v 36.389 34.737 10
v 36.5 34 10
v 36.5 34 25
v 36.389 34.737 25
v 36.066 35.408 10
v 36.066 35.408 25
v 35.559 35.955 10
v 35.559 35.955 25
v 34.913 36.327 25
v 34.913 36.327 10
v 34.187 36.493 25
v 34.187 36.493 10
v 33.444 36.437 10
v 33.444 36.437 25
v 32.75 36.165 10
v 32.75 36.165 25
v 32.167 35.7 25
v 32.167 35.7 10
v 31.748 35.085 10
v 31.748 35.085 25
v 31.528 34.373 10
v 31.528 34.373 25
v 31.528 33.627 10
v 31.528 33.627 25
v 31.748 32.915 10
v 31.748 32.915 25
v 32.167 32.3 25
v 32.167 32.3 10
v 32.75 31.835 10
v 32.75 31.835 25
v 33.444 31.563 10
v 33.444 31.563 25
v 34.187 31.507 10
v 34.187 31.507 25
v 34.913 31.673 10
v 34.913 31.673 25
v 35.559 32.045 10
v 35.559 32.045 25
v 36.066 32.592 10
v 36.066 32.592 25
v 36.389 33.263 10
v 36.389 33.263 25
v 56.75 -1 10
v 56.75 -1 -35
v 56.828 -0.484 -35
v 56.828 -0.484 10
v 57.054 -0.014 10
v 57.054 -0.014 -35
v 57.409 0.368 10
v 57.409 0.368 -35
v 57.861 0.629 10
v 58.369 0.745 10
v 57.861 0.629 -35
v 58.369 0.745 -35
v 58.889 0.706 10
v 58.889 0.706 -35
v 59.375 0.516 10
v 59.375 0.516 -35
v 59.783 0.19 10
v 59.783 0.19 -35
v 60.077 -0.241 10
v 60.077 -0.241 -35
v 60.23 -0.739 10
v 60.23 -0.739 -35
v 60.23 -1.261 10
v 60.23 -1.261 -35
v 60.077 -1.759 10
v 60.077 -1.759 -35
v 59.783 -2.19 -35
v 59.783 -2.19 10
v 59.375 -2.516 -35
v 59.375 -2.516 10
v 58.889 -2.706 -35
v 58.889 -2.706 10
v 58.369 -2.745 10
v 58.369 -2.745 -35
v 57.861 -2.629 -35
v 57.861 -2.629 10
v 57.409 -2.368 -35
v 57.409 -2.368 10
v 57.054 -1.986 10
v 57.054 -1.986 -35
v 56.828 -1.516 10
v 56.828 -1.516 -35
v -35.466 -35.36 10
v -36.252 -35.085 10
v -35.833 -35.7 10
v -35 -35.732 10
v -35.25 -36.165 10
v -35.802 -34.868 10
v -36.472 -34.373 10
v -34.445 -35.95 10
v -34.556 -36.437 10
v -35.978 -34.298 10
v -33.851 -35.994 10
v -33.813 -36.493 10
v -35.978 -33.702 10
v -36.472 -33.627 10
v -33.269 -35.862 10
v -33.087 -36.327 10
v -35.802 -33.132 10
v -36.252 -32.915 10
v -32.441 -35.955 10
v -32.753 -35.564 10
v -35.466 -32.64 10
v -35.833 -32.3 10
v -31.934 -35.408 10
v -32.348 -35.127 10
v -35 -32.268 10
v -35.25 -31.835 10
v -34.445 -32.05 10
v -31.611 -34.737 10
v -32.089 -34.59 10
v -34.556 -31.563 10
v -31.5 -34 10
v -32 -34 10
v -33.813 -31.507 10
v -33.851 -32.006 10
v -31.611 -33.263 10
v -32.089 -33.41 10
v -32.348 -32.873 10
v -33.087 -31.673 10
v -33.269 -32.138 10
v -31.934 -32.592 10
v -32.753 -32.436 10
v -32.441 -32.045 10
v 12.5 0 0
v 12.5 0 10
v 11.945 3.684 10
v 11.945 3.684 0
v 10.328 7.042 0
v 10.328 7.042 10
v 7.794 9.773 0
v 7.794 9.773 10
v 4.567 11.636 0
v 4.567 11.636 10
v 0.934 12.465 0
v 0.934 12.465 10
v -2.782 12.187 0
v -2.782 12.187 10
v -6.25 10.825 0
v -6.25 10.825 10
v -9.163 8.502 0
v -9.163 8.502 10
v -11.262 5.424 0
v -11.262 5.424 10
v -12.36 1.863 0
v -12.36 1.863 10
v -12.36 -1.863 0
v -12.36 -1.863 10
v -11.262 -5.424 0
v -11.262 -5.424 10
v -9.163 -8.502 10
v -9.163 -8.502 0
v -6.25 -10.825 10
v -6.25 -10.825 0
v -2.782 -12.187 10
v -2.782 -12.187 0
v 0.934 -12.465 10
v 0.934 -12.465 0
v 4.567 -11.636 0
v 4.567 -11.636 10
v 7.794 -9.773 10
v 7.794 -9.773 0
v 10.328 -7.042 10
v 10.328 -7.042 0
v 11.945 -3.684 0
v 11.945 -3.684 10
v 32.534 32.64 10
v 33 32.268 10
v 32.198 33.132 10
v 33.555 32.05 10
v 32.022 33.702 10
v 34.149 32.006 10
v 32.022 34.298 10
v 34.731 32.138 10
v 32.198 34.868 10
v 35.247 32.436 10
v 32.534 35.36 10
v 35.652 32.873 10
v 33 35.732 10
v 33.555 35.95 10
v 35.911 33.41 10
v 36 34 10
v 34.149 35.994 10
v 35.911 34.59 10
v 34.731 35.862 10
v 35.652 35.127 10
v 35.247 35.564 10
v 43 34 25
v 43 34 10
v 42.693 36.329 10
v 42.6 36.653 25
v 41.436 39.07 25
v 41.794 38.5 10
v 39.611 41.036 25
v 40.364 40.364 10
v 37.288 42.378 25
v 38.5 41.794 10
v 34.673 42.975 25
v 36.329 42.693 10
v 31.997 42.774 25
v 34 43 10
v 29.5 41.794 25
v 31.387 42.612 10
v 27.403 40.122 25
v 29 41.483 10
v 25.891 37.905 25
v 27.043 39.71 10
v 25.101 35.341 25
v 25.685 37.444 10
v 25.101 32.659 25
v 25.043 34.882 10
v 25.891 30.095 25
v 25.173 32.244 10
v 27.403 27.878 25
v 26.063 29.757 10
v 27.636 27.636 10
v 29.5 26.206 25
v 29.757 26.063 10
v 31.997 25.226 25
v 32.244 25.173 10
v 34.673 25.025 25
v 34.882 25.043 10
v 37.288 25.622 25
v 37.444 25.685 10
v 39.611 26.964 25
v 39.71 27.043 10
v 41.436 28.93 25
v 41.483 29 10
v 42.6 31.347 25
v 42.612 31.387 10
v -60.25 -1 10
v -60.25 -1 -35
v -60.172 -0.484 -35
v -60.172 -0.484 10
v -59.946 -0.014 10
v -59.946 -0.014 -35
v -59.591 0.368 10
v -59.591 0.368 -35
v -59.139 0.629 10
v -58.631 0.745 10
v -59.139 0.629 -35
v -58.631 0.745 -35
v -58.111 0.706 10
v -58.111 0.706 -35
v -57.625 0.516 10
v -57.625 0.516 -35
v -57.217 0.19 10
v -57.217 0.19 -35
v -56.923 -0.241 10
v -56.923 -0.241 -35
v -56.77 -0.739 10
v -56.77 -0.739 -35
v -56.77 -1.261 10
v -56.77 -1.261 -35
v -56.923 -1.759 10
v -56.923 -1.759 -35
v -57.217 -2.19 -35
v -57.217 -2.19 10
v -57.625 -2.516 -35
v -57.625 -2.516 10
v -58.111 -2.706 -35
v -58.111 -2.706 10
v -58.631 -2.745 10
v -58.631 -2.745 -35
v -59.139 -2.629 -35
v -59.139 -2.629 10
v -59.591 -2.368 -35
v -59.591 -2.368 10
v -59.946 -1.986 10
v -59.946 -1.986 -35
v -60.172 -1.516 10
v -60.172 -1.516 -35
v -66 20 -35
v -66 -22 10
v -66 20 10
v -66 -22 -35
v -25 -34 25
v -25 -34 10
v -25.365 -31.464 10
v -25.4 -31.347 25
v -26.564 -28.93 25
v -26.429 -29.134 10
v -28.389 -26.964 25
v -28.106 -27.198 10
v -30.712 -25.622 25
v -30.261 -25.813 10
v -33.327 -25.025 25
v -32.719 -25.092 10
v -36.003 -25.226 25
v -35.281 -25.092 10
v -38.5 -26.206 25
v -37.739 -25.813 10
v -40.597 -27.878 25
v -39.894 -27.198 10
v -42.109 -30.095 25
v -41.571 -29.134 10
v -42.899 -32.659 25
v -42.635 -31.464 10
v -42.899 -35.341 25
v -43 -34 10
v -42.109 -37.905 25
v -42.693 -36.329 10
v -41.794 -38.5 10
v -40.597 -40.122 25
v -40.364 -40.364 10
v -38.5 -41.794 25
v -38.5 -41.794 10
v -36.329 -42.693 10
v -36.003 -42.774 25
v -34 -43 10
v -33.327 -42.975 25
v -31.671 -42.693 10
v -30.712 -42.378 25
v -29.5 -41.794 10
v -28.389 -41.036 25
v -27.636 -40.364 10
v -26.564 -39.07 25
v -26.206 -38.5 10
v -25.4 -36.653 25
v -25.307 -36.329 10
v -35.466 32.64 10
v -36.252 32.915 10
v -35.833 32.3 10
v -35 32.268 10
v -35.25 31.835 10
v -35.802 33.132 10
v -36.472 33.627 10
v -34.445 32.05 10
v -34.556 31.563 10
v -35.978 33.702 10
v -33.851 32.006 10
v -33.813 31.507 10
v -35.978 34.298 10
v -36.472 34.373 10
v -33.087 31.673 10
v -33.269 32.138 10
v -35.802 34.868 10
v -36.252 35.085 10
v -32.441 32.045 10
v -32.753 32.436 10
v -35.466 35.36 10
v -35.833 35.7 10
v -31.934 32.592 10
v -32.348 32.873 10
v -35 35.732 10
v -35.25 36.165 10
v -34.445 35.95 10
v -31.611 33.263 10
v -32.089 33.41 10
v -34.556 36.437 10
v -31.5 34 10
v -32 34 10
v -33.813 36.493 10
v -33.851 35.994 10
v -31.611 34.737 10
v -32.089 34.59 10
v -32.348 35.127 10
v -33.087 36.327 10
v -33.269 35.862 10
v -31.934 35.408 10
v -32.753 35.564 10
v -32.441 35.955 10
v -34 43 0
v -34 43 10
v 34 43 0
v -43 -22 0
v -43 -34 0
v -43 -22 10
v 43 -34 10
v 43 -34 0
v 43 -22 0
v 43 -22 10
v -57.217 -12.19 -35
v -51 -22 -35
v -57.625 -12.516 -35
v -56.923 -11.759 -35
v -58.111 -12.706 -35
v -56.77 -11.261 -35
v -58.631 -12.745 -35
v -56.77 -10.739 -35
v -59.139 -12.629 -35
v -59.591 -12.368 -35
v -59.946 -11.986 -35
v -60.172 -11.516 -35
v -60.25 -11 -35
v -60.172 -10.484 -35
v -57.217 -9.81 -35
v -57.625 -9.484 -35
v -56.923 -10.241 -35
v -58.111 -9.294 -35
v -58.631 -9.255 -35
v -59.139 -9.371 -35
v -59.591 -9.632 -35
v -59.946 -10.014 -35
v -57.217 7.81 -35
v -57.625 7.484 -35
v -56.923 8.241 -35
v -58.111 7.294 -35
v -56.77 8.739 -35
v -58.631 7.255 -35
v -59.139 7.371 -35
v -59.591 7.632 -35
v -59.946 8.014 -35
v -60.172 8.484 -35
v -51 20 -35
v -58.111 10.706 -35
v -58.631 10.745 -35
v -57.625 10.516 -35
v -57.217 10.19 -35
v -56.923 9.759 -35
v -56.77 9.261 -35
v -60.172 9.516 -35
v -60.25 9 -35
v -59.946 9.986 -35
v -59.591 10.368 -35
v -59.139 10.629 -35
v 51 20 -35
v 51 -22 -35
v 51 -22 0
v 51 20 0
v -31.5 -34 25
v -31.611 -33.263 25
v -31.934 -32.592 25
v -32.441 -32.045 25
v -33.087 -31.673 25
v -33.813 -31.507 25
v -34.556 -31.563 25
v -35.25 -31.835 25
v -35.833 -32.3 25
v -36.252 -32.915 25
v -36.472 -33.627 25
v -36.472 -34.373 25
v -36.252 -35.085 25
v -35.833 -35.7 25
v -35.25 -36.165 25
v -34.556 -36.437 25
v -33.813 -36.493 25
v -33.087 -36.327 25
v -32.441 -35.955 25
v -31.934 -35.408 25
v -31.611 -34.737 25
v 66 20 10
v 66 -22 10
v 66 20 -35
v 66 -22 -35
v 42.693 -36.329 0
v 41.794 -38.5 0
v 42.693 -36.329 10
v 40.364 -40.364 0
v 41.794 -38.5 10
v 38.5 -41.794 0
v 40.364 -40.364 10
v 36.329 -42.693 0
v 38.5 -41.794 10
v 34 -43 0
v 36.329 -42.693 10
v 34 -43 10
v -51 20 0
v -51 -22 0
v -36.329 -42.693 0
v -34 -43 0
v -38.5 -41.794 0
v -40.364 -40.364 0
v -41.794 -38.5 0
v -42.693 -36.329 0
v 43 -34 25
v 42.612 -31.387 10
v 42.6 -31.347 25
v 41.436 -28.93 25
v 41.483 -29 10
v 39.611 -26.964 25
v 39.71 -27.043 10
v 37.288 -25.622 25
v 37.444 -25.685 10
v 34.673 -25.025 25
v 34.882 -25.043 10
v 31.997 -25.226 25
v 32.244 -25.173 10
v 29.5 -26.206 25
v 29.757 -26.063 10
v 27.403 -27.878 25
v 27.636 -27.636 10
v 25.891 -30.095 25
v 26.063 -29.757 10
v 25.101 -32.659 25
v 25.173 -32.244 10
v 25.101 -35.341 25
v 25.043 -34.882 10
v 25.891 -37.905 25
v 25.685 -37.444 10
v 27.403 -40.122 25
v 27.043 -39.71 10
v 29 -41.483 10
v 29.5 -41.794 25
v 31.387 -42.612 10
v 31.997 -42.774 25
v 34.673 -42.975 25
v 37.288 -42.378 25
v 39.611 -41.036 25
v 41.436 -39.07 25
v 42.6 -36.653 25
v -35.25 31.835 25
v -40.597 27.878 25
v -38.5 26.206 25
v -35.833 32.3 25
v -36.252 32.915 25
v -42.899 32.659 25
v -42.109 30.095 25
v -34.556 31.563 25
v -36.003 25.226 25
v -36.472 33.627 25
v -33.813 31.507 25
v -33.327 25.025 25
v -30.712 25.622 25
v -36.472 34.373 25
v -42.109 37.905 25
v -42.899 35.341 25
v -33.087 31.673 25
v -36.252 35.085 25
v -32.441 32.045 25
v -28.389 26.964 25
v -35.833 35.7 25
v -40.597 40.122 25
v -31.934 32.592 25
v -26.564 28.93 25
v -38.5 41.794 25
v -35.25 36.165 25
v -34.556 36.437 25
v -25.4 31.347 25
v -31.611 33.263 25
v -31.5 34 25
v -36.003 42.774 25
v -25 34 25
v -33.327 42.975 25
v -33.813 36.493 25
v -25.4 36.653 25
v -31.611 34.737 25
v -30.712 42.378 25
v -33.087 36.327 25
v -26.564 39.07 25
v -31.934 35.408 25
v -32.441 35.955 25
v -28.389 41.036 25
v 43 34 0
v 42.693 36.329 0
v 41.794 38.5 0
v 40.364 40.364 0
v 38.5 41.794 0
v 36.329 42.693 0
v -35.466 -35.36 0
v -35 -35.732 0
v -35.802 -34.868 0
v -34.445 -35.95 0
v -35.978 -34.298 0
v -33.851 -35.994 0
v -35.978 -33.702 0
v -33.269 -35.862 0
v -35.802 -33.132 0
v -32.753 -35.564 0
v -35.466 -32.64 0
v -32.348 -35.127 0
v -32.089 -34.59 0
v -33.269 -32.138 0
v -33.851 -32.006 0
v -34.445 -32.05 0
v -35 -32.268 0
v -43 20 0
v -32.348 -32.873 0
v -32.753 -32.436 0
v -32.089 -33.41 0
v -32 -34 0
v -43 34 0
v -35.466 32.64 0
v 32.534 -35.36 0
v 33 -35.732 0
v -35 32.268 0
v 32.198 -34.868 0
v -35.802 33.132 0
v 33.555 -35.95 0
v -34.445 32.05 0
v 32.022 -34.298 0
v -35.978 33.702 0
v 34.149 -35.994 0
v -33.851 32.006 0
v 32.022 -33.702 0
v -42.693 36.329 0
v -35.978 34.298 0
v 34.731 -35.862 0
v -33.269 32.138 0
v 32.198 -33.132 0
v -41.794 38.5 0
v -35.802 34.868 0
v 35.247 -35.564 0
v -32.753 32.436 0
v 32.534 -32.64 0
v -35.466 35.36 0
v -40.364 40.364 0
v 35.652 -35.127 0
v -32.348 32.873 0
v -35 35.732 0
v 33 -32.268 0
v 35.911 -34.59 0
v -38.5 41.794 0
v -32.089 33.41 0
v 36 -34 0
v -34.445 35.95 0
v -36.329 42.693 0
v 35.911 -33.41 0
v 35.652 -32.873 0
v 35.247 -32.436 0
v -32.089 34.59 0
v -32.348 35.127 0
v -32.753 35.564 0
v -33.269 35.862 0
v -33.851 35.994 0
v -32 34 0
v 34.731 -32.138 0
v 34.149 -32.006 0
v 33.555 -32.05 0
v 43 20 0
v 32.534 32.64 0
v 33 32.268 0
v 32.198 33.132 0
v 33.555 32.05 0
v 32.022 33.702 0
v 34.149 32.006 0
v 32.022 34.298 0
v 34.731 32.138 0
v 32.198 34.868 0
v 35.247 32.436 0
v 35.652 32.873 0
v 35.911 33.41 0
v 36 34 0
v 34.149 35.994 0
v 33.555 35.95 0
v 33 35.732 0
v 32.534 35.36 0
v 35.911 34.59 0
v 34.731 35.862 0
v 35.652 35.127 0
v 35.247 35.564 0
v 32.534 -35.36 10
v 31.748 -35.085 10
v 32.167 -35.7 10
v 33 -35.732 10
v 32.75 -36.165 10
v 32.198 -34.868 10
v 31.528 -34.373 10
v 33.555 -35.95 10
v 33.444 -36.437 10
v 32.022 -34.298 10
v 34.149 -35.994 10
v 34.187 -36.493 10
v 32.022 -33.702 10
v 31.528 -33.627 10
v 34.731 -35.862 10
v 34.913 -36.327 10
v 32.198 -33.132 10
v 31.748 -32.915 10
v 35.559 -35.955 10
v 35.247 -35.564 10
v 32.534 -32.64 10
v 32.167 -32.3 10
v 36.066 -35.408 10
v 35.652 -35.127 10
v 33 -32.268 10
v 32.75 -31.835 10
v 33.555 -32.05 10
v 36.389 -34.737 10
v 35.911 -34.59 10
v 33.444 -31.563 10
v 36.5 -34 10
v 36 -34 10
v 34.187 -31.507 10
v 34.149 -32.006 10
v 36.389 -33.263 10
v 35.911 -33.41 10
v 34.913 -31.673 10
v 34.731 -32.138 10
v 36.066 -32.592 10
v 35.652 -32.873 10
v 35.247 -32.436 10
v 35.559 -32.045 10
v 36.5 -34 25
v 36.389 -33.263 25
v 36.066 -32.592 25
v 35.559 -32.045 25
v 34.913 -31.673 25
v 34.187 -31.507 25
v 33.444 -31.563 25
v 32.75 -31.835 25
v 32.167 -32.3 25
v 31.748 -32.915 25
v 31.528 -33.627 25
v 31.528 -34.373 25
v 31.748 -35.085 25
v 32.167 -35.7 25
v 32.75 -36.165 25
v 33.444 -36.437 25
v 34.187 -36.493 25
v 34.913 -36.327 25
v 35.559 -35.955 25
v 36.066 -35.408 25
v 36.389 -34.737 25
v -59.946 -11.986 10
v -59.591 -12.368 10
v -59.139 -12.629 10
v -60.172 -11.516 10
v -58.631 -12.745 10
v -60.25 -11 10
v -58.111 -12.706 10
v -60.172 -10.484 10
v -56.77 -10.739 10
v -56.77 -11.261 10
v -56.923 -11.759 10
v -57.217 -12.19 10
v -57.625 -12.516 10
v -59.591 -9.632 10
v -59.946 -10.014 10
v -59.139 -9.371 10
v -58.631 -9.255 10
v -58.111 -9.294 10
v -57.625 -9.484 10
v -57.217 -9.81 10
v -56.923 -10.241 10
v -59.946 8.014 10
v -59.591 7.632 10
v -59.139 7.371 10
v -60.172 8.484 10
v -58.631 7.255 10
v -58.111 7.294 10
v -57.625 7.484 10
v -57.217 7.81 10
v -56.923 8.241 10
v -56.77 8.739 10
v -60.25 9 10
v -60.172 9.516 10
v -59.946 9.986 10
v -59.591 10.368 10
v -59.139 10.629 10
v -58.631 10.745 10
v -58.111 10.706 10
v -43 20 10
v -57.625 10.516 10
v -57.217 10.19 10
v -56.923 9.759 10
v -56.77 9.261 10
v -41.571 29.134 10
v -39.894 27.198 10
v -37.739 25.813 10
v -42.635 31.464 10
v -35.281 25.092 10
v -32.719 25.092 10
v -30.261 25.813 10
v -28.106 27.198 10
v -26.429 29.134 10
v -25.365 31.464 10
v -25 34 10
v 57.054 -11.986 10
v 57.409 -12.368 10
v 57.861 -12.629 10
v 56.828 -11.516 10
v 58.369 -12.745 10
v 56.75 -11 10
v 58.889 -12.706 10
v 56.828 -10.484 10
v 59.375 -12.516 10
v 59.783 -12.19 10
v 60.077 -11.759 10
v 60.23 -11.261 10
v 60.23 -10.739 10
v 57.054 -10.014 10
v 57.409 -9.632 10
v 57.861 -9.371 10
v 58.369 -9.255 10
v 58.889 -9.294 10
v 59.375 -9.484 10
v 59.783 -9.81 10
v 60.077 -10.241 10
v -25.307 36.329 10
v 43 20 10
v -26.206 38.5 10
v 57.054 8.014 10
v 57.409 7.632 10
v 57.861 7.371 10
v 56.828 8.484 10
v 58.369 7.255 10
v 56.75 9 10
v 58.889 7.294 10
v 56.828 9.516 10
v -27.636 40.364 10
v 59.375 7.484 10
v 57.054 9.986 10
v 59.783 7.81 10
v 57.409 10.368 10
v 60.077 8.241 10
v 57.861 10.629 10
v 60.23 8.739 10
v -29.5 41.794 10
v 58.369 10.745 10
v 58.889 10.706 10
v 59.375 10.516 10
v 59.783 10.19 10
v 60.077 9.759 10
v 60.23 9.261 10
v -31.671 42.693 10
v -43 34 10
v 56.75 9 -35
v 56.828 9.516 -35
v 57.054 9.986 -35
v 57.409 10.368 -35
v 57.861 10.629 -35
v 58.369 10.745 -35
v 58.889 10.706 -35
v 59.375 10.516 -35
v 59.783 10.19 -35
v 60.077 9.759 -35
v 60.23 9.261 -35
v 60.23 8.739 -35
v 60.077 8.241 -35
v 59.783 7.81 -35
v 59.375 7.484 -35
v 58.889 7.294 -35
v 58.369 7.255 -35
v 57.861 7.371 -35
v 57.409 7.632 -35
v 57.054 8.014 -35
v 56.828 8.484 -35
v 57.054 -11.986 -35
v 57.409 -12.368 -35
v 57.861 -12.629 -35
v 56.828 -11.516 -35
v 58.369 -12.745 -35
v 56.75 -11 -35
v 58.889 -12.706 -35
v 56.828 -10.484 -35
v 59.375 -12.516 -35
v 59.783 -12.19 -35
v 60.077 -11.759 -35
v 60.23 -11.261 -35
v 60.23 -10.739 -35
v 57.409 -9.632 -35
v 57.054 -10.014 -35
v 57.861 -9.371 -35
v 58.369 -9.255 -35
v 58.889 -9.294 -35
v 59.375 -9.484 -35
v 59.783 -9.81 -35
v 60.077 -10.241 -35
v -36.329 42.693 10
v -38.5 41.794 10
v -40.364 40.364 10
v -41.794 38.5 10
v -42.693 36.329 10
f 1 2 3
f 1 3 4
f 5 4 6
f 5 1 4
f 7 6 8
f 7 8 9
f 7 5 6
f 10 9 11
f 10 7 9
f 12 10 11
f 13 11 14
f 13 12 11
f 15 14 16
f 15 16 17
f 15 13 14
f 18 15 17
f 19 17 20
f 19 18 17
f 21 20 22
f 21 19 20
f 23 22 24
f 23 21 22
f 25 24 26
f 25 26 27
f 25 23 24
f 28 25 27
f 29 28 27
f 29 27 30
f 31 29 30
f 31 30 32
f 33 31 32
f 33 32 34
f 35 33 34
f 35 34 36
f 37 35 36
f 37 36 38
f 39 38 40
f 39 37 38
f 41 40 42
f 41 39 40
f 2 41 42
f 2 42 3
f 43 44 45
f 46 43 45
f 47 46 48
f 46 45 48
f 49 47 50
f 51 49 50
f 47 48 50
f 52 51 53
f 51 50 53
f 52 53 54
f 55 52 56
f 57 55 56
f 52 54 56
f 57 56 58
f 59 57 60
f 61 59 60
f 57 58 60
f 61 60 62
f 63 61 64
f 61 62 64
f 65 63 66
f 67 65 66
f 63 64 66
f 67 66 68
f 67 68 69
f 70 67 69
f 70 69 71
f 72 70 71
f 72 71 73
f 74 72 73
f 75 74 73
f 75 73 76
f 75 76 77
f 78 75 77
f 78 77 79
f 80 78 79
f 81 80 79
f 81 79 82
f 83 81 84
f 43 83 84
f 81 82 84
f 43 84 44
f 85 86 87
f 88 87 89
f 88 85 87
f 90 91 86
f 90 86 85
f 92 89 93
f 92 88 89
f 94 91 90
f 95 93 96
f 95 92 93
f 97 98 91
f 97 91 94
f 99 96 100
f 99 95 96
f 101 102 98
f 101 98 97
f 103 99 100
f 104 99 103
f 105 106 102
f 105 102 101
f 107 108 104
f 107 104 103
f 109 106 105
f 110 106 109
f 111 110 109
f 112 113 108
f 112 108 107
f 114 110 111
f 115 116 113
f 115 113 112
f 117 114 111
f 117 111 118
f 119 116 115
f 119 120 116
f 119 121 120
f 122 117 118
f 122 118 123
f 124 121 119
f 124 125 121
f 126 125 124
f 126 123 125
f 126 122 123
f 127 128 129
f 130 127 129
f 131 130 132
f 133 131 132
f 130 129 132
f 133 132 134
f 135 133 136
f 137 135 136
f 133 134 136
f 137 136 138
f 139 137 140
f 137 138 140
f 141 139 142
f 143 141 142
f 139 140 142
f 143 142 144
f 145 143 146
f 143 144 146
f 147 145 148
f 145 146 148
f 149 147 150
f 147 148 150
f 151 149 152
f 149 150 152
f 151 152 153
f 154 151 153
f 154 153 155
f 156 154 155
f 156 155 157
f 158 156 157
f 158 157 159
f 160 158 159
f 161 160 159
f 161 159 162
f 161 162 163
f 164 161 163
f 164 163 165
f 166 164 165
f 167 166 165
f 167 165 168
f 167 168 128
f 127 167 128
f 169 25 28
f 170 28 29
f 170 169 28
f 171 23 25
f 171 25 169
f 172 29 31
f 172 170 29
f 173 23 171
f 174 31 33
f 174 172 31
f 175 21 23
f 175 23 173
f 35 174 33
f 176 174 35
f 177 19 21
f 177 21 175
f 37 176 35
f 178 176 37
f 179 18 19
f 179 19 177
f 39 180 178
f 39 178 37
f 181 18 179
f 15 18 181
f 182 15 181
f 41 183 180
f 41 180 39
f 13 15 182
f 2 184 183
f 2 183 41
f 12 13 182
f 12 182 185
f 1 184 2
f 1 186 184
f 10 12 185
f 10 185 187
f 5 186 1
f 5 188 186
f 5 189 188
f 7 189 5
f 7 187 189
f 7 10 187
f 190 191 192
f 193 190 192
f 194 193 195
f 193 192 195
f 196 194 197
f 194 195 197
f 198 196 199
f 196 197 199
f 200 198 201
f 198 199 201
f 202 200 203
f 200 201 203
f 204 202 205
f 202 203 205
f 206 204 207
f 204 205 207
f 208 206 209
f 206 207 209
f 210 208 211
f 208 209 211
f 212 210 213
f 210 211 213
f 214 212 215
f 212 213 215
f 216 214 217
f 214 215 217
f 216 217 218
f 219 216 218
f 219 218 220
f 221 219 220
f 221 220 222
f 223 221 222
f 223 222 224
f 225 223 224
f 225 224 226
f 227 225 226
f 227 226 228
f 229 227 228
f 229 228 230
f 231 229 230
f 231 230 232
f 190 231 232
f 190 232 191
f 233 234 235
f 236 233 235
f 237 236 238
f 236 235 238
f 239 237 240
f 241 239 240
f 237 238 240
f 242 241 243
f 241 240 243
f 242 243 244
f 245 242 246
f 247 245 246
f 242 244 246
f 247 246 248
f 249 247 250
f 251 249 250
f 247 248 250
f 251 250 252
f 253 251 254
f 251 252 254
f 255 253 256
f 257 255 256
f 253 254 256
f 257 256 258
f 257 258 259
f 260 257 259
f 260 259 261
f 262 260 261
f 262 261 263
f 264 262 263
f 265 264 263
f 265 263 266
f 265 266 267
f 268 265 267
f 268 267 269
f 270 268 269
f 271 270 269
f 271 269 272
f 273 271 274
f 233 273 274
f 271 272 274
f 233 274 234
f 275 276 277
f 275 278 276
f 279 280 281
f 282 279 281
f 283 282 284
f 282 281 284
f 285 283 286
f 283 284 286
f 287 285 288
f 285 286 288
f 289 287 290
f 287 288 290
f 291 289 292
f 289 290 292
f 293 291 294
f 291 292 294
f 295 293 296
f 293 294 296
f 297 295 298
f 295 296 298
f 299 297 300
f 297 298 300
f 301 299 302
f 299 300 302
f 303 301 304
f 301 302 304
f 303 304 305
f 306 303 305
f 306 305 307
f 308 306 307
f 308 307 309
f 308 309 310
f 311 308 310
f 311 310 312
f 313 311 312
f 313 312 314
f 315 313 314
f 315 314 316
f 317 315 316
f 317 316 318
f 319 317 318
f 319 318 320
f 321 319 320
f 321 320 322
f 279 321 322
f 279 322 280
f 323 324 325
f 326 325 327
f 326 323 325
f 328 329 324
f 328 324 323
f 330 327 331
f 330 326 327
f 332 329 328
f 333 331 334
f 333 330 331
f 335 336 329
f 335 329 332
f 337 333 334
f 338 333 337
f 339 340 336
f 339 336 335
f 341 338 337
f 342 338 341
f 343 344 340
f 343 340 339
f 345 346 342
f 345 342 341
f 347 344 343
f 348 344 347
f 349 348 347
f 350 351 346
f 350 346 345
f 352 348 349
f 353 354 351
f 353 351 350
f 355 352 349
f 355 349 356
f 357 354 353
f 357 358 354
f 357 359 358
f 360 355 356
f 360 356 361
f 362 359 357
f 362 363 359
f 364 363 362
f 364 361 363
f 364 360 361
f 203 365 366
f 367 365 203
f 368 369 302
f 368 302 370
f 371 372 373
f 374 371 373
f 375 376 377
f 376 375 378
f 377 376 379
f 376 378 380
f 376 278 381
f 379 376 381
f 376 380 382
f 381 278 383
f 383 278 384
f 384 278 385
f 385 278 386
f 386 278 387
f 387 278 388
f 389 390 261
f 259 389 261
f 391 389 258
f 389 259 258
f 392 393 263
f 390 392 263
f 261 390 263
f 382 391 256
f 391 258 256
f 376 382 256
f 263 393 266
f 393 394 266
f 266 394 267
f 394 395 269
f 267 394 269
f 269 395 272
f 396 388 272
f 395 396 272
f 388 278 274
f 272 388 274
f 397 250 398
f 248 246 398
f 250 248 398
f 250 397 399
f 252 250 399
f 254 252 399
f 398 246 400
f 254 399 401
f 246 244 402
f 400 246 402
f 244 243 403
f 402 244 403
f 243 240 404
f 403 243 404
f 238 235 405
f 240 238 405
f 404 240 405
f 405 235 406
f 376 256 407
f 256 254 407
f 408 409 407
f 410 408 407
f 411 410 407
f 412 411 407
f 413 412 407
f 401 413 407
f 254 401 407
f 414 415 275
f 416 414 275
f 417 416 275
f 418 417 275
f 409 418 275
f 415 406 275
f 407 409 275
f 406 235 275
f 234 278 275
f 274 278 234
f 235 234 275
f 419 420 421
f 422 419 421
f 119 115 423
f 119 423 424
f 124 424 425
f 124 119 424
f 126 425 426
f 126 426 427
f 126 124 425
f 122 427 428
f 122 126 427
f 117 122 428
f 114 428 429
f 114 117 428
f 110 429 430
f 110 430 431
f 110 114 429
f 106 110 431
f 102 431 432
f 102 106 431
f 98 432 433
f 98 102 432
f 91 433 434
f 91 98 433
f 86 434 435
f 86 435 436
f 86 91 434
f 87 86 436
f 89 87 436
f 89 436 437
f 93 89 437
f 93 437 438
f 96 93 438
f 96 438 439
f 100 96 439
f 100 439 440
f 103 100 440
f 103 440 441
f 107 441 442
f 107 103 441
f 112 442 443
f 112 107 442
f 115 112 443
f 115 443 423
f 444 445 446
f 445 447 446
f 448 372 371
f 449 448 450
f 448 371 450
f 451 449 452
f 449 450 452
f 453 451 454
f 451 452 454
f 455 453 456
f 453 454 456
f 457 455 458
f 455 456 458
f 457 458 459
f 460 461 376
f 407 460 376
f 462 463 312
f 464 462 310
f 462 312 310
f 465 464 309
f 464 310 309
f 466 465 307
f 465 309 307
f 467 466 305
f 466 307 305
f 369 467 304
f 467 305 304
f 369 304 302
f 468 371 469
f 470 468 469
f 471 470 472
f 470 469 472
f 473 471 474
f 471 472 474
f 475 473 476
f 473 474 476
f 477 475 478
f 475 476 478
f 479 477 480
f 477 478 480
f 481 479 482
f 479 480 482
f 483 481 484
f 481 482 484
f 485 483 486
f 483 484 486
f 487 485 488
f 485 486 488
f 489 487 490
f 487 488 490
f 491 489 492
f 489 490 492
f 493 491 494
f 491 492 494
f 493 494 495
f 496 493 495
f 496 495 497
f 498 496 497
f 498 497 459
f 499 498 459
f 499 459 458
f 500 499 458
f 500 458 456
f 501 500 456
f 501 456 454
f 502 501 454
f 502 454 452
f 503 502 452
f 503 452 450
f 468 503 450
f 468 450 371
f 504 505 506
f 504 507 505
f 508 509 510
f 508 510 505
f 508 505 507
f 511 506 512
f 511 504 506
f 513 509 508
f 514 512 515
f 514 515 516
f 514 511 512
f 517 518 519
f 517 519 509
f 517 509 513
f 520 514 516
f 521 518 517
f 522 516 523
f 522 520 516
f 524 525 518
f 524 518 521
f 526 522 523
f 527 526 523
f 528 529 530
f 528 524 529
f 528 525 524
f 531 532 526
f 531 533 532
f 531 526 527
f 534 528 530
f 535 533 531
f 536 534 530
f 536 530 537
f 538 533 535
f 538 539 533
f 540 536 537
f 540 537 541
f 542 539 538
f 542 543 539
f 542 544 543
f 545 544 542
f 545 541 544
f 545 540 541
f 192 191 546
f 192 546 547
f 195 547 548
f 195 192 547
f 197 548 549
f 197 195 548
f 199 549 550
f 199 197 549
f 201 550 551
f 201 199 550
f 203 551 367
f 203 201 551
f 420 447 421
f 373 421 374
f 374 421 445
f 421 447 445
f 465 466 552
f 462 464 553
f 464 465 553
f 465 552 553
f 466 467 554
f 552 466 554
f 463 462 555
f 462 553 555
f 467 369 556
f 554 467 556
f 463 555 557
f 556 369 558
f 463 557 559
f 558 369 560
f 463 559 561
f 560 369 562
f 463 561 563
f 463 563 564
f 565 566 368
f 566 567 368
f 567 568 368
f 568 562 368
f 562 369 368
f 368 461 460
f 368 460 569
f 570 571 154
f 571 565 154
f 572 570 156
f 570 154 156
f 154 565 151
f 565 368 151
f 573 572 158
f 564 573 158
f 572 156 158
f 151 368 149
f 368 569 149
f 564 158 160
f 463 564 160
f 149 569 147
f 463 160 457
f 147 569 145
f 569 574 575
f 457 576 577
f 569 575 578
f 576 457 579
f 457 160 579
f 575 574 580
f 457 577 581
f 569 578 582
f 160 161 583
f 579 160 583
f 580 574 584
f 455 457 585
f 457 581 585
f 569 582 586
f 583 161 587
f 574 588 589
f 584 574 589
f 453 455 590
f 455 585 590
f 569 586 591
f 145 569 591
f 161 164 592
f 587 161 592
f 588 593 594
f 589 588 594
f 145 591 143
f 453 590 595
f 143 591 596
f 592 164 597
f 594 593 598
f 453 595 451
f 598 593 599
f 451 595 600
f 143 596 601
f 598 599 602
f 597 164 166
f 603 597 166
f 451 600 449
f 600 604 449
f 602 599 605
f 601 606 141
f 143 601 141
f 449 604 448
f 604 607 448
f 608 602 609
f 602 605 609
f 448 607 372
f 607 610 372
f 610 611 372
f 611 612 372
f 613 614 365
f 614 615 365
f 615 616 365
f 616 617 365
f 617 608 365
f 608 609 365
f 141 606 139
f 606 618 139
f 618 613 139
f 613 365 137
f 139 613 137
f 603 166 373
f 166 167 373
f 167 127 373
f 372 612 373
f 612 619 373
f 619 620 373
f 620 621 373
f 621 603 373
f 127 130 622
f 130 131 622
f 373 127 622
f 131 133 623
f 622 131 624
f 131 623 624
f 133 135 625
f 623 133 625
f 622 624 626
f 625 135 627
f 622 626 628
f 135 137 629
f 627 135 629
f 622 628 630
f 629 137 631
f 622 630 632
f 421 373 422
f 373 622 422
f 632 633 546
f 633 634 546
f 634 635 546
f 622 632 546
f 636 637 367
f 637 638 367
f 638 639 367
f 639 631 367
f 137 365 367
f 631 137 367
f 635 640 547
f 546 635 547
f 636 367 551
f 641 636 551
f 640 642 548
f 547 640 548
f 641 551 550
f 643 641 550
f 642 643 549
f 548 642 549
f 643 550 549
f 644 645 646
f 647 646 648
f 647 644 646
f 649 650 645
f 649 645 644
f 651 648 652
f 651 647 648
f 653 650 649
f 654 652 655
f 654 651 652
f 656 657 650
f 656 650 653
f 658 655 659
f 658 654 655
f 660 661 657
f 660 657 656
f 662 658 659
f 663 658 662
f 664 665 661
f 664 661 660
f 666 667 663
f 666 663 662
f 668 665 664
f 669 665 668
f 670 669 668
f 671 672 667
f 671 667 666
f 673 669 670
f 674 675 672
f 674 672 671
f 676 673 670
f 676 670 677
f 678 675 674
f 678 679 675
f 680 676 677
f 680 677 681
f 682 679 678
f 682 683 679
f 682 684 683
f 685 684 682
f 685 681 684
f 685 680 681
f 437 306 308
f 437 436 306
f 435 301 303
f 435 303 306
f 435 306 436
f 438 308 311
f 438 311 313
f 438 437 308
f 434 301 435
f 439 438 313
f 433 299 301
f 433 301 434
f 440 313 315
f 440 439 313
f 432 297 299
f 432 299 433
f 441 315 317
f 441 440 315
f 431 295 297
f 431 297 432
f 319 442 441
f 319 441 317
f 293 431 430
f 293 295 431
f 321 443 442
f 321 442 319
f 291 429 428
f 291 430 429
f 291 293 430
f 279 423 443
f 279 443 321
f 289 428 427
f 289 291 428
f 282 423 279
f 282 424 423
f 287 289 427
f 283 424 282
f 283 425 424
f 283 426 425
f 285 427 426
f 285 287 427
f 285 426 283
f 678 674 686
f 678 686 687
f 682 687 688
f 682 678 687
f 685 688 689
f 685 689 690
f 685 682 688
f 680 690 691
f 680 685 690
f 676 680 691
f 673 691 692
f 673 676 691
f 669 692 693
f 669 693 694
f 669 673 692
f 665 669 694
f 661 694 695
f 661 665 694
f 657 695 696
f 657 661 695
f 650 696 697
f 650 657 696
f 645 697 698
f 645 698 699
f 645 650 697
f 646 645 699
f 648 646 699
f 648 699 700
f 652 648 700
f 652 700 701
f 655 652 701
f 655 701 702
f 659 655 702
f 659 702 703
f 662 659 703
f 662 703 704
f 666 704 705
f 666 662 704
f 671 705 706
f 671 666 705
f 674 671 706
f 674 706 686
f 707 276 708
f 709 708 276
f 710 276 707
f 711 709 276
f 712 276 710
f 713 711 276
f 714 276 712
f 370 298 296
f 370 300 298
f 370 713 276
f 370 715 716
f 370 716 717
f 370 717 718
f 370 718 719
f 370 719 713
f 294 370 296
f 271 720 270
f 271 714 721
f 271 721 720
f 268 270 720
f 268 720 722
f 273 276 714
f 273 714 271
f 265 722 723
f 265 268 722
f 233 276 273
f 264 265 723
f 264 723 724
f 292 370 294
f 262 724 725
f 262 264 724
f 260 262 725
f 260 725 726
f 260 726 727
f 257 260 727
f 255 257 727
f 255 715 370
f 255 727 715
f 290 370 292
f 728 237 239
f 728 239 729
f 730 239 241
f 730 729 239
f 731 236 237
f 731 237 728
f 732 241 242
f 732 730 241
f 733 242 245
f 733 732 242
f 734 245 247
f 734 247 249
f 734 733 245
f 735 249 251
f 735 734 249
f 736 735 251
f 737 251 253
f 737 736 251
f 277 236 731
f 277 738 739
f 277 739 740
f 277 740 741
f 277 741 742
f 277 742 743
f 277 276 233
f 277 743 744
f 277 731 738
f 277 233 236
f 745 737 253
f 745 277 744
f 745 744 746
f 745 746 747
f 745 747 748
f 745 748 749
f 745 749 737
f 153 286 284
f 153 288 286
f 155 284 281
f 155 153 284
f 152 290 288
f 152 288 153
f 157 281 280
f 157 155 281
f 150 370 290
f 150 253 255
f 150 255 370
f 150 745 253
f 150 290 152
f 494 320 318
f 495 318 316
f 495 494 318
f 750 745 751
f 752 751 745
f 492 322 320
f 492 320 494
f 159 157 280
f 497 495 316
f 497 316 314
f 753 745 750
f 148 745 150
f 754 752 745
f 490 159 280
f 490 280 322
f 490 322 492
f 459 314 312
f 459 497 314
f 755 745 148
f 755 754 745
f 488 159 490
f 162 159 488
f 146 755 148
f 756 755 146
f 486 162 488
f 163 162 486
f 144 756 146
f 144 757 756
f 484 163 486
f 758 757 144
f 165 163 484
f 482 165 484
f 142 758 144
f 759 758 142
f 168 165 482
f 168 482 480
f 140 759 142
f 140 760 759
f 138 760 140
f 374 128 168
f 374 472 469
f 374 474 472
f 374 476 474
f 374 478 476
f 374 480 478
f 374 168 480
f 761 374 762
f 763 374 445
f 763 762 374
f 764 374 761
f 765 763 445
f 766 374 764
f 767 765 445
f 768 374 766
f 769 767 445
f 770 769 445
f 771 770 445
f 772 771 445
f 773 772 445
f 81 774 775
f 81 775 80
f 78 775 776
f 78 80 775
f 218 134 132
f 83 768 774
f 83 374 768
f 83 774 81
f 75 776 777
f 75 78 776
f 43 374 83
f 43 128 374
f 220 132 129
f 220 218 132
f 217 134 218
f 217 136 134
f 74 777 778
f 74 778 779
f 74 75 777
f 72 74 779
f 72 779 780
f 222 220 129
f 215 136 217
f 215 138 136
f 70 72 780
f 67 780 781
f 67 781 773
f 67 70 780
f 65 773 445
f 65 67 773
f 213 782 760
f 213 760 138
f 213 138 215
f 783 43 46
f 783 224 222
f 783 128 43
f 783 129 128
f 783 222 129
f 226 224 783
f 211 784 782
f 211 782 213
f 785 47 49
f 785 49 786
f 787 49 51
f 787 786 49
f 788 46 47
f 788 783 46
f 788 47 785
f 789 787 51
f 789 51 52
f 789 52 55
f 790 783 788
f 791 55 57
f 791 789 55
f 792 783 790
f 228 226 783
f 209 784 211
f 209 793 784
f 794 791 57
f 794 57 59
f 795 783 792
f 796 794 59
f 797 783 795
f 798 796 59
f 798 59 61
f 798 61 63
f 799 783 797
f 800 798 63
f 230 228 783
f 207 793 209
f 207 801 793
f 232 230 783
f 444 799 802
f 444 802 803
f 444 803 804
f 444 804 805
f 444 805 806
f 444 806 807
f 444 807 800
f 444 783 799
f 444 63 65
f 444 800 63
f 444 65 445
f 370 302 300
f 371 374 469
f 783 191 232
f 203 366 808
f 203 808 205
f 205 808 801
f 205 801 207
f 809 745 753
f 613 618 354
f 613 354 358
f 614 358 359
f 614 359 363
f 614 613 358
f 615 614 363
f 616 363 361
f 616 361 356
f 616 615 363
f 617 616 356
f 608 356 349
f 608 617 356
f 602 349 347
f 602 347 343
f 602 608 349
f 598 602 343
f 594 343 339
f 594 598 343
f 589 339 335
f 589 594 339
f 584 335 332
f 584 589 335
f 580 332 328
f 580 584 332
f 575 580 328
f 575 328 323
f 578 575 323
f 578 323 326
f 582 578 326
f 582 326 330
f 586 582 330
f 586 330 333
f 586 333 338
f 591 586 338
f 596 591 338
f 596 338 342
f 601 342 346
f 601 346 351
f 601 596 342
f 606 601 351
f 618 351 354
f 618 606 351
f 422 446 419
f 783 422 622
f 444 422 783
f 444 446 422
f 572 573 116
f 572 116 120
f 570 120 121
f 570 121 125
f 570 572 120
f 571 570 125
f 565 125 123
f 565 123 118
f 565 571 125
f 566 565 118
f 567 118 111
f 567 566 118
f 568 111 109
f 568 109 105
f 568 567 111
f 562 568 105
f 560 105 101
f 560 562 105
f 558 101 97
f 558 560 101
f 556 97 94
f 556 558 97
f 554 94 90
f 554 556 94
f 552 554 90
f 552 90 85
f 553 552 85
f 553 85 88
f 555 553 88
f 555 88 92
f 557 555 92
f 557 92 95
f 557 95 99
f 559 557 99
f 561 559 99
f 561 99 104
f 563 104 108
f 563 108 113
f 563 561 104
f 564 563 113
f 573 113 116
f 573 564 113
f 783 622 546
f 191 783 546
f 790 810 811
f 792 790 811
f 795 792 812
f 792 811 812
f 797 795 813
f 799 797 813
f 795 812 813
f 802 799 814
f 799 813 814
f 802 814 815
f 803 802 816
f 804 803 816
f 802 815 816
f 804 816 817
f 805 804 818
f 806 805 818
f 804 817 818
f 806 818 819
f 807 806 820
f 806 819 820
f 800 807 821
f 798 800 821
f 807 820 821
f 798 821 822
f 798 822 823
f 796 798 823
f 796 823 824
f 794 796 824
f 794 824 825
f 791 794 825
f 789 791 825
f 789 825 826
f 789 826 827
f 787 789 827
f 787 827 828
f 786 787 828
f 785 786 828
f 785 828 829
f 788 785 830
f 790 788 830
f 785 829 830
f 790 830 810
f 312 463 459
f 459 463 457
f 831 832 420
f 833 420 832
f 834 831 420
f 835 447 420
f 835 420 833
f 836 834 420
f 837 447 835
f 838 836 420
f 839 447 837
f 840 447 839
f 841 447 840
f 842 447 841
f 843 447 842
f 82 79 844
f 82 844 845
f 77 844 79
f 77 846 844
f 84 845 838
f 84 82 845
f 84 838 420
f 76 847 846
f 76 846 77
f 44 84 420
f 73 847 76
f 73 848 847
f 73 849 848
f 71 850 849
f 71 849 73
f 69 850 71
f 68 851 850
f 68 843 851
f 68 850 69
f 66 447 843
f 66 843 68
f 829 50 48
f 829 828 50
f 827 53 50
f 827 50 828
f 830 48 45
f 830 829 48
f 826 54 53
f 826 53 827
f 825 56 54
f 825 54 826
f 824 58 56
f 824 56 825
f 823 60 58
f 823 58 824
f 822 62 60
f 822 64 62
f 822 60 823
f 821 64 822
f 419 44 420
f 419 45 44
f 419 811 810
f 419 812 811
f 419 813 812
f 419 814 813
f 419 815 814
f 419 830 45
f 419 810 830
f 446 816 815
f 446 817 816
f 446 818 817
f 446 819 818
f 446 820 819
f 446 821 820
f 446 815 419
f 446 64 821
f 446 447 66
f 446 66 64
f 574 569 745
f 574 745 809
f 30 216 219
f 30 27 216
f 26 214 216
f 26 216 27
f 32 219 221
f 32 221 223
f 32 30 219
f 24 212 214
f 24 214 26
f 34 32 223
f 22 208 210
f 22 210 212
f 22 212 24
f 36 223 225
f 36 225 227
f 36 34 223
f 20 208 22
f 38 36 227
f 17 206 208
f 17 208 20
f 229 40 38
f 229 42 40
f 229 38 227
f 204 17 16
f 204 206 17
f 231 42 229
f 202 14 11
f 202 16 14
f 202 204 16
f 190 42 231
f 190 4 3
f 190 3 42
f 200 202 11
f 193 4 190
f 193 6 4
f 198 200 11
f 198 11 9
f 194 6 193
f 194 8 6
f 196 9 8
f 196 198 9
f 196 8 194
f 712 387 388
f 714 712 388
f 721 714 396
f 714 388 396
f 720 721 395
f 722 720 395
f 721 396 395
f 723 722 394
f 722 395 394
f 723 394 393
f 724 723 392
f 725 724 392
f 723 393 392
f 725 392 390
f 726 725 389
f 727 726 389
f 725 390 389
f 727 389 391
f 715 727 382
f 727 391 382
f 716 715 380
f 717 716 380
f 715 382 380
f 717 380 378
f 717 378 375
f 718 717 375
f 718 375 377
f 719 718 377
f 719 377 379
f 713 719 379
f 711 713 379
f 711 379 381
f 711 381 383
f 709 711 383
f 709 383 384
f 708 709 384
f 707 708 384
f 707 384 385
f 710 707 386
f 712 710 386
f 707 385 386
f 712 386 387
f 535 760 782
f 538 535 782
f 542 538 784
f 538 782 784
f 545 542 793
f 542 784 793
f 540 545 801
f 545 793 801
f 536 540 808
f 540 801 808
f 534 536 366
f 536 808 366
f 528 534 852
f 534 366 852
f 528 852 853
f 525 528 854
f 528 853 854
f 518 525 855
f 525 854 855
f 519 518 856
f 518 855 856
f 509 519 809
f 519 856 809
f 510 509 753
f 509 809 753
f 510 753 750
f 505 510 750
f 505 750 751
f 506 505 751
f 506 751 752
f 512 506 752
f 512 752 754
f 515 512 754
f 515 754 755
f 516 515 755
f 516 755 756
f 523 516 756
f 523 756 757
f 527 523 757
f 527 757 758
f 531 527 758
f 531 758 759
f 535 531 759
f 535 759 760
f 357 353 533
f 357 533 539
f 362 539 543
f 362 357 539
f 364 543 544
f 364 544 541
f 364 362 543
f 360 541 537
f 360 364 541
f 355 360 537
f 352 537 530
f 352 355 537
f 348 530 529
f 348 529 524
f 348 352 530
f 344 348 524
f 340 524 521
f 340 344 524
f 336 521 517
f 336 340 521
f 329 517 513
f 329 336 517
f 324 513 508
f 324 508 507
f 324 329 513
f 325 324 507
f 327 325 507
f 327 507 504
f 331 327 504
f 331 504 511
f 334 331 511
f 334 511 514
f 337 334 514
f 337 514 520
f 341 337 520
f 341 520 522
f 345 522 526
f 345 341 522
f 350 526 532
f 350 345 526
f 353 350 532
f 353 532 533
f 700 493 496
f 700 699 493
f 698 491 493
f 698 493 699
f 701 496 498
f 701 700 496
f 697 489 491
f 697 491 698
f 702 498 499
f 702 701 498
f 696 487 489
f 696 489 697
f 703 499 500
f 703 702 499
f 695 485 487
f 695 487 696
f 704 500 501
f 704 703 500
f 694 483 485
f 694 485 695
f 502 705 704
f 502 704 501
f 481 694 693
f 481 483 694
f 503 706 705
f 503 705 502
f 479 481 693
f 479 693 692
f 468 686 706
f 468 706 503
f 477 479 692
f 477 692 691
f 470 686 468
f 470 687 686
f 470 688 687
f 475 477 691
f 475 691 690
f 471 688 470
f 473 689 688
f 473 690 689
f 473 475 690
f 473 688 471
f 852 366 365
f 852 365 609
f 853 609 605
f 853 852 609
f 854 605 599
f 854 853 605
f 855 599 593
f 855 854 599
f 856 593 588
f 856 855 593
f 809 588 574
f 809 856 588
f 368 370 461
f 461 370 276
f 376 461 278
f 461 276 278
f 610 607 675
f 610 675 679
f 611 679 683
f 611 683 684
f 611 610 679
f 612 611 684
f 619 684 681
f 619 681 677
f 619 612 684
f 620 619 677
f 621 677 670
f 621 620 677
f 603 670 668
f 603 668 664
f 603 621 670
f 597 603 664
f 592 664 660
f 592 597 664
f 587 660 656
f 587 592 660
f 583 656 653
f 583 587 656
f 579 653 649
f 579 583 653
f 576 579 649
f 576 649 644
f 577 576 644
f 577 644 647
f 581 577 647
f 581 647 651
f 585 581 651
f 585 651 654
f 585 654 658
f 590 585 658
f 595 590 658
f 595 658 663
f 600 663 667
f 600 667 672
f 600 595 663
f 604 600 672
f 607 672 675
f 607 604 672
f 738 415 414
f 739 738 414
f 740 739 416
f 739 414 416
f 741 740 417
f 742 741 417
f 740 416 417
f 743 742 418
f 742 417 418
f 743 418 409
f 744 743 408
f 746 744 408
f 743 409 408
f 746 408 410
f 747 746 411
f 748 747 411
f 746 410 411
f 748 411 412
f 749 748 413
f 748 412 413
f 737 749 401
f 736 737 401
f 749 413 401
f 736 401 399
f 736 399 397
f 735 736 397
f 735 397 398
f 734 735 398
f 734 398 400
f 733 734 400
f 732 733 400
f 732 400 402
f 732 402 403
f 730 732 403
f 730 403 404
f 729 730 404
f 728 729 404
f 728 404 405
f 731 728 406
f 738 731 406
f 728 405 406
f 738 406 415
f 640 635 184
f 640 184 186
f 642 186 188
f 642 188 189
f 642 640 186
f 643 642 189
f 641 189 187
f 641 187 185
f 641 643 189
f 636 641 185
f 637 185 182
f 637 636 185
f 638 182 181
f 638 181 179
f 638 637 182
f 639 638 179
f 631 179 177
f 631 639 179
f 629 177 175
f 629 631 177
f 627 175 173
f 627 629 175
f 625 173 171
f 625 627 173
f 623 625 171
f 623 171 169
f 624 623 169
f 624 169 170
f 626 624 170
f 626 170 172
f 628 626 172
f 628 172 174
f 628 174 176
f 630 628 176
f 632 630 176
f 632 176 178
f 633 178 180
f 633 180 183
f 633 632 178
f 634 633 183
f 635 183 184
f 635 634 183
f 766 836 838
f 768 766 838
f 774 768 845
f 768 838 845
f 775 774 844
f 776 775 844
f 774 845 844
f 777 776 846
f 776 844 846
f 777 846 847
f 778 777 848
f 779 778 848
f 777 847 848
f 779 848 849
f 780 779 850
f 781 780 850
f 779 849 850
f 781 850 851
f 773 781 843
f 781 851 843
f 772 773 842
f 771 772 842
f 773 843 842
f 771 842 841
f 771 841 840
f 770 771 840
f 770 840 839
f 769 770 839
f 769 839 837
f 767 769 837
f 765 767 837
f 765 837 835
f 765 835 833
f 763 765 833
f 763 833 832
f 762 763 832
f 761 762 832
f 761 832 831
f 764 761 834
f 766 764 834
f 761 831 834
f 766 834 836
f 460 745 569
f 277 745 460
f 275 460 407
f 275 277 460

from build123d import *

# Parameters (mm, degrees)
SKETCH_1_W          = 86
SKETCH_1_H          = 86
SKETCH_1_R          = 2
EXTRUDE_1_DEPTH     = 10
FILLET_1_R          = 5
SKETCH_2_R          = 9
SKETCH_2_R_2        = 2.5
EXTRUDE_2_DEPTH     = 15
SKETCH_3_R          = 12.5
CUT_EXTRUDE_1_DEPTH = 16
SKETCH_8_W          = 10
SKETCH_8_H          = 42
EXTRUDE_7_DEPTH     = 35
EXTRUDE_7_2_DEPTH   = 35
SKETCH_9_W          = 23
SKETCH_9_H          = 42
EXTRUDE_8_DEPTH     = 10
CUT_EXTRUDE_2_DEPTH = 10
SKETCH_11_W         = 35
SKETCH_11_H         = 42
EXTRUDE_9_DEPTH     = 5
SKETCH_12_W         = 35
SKETCH_12_H         = 42
EXTRUDE_10_DEPTH    = 5
SKETCH_13_R         = 1.75
CUT_EXTRUDE_3_DEPTH = 45


with BuildPart() as part:
    # 草图1 → 凸台-拉伸1 (new body)
    with BuildSketch(Plane.XY):
        Rectangle(SKETCH_1_W, SKETCH_1_H)
        with Locations((-34, 34)):
            Circle(SKETCH_1_R, mode=Mode.SUBTRACT)
        with Locations((34, 34)):
            Circle(SKETCH_1_R, mode=Mode.SUBTRACT)
        with Locations((34, -34)):
            Circle(SKETCH_1_R, mode=Mode.SUBTRACT)
        with Locations((-34, -34)):
            Circle(SKETCH_1_R, mode=Mode.SUBTRACT)
    extrude(amount=EXTRUDE_1_DEPTH)

    # 圆角1
    fillet_1_edges = [part.edges().sort_by_distance(p)[0] for p in [
        (-43, 43, 5),
        (43, 43, 5),
        (43, -43, 5),
        (-43, -43, 5),
    ]]
    fillet(fillet_1_edges, radius=FILLET_1_R)

    # 草图2 → 凸台-拉伸2 (add)
    with BuildSketch(Plane.XY.offset(10)):
        with Locations((-34, 34)):
            Circle(SKETCH_2_R)
        with Locations((-34, 34)):
            Circle(SKETCH_2_R_2, mode=Mode.SUBTRACT)
        with Locations((34, 34)):
            Circle(SKETCH_2_R)
        with Locations((34, 34)):
            Circle(SKETCH_2_R_2, mode=Mode.SUBTRACT)
        with Locations((34, -34)):
            Circle(SKETCH_2_R)
        with Locations((34, -34)):
            Circle(SKETCH_2_R_2, mode=Mode.SUBTRACT)
        with Locations((-34, -34)):
            Circle(SKETCH_2_R)
        with Locations((-34, -34)):
            Circle(SKETCH_2_R_2, mode=Mode.SUBTRACT)
    extrude(amount=EXTRUDE_2_DEPTH)

    # 草图3 → 切除-拉伸1 (cut)
    with BuildSketch(Plane.XY.offset(10)):
        Circle(SKETCH_3_R)
    extrude(amount=-CUT_EXTRUDE_1_DEPTH, mode=Mode.SUBTRACT)



with BuildPart() as body_2:
    # 草图8 → 凸台-拉伸7 (new body)
    with BuildSketch(Plane(origin=(0, 0, 0), x_dir=(-1, 0, 0), z_dir=(0, 0, -1))):
        with Locations((-61, -1)):
            Rectangle(SKETCH_8_W, SKETCH_8_H)
    extrude(amount=EXTRUDE_7_DEPTH)


with BuildPart() as body_3:
    # 草图8 → Extrude 7 2 (new body)
    with BuildSketch(Plane(origin=(0, 0, 0), x_dir=(-1, 0, 0), z_dir=(0, 0, -1))):
        with Locations((61, -1)):
            Rectangle(SKETCH_8_W, SKETCH_8_H)
    extrude(amount=EXTRUDE_7_2_DEPTH)


with BuildPart() as part_1:
    add(part.part)

    add(body_2.part)  # 凸台-拉伸8 merges body 2

    add(body_3.part)  # 凸台-拉伸8 merges body 3
    # 草图9 → 凸台-拉伸8 (add)
    with BuildSketch(Plane.XY):
        with Locations((-54.5, -1)):
            Rectangle(SKETCH_9_W, SKETCH_9_H)
        with Locations((54.5, -1)):
            Rectangle(SKETCH_9_W, SKETCH_9_H)
    extrude(amount=EXTRUDE_8_DEPTH)

    # 草图10 → 切除-拉伸2 (cut)
    with BuildSketch(Plane.XY.offset(10)):
        with BuildLine():
            Line((34, 43), (43, 43))
            Line((43, 43), (43, 34))
            ThreePointArc((43, 34), (40.363961031, 40.363961031), (34, 43))
        make_face()
        with BuildLine():
            Line((-43, 43), (-34, 43))
            ThreePointArc((-34, 43), (-40.363961031, 40.363961031), (-43, 34))
            Line((-43, 34), (-43, 43))
        make_face()
        with BuildLine():
            Line((-43, -43), (-34, -43))
            ThreePointArc((-34, -43), (-40.363961031, -40.363961031), (-43, -34))
            Line((-43, -34), (-43, -43))
        make_face()
        with BuildLine():
            Line((34, -43), (43, -43))
            Line((43, -43), (43, -34))
            ThreePointArc((43, -34), (40.363961031, -40.363961031), (34, -43))
        make_face()
    extrude(amount=-CUT_EXTRUDE_2_DEPTH, mode=Mode.SUBTRACT)

    # 草图11 → 凸台-拉伸9 (add)
    with BuildSketch(Plane.ZY.offset(-56)):
        with Locations((-17.5, -1)):
            Rectangle(SKETCH_11_W, SKETCH_11_H)
    extrude(amount=EXTRUDE_9_DEPTH)

    # 草图12 → 凸台-拉伸10 (add)
    with BuildSketch(Plane(origin=(-56, 0, 0), x_dir=(0, 0, -1), z_dir=(1, 0, 0))):
        with Locations((17.5, -1)):
            Rectangle(SKETCH_12_W, SKETCH_12_H)
    extrude(amount=EXTRUDE_10_DEPTH)

    # 草图13 → 切除-拉伸3 (cut)
    with BuildSketch(Plane(origin=(0, 0, -35), x_dir=(-1, 0, 0), z_dir=(0, 0, -1))):
        with Locations((58.5, 9)):
            Circle(SKETCH_13_R)
        with Locations((58.5, -1)):
            Circle(SKETCH_13_R)
        with Locations((58.5, -11)):
            Circle(SKETCH_13_R)
        with Locations((-58.5, -11)):
            Circle(SKETCH_13_R)
        with Locations((-58.5, -1)):
            Circle(SKETCH_13_R)
        with Locations((-58.5, 9)):
            Circle(SKETCH_13_R)
    extrude(amount=-CUT_EXTRUDE_3_DEPTH, mode=Mode.SUBTRACT)


solid = part_1.part
